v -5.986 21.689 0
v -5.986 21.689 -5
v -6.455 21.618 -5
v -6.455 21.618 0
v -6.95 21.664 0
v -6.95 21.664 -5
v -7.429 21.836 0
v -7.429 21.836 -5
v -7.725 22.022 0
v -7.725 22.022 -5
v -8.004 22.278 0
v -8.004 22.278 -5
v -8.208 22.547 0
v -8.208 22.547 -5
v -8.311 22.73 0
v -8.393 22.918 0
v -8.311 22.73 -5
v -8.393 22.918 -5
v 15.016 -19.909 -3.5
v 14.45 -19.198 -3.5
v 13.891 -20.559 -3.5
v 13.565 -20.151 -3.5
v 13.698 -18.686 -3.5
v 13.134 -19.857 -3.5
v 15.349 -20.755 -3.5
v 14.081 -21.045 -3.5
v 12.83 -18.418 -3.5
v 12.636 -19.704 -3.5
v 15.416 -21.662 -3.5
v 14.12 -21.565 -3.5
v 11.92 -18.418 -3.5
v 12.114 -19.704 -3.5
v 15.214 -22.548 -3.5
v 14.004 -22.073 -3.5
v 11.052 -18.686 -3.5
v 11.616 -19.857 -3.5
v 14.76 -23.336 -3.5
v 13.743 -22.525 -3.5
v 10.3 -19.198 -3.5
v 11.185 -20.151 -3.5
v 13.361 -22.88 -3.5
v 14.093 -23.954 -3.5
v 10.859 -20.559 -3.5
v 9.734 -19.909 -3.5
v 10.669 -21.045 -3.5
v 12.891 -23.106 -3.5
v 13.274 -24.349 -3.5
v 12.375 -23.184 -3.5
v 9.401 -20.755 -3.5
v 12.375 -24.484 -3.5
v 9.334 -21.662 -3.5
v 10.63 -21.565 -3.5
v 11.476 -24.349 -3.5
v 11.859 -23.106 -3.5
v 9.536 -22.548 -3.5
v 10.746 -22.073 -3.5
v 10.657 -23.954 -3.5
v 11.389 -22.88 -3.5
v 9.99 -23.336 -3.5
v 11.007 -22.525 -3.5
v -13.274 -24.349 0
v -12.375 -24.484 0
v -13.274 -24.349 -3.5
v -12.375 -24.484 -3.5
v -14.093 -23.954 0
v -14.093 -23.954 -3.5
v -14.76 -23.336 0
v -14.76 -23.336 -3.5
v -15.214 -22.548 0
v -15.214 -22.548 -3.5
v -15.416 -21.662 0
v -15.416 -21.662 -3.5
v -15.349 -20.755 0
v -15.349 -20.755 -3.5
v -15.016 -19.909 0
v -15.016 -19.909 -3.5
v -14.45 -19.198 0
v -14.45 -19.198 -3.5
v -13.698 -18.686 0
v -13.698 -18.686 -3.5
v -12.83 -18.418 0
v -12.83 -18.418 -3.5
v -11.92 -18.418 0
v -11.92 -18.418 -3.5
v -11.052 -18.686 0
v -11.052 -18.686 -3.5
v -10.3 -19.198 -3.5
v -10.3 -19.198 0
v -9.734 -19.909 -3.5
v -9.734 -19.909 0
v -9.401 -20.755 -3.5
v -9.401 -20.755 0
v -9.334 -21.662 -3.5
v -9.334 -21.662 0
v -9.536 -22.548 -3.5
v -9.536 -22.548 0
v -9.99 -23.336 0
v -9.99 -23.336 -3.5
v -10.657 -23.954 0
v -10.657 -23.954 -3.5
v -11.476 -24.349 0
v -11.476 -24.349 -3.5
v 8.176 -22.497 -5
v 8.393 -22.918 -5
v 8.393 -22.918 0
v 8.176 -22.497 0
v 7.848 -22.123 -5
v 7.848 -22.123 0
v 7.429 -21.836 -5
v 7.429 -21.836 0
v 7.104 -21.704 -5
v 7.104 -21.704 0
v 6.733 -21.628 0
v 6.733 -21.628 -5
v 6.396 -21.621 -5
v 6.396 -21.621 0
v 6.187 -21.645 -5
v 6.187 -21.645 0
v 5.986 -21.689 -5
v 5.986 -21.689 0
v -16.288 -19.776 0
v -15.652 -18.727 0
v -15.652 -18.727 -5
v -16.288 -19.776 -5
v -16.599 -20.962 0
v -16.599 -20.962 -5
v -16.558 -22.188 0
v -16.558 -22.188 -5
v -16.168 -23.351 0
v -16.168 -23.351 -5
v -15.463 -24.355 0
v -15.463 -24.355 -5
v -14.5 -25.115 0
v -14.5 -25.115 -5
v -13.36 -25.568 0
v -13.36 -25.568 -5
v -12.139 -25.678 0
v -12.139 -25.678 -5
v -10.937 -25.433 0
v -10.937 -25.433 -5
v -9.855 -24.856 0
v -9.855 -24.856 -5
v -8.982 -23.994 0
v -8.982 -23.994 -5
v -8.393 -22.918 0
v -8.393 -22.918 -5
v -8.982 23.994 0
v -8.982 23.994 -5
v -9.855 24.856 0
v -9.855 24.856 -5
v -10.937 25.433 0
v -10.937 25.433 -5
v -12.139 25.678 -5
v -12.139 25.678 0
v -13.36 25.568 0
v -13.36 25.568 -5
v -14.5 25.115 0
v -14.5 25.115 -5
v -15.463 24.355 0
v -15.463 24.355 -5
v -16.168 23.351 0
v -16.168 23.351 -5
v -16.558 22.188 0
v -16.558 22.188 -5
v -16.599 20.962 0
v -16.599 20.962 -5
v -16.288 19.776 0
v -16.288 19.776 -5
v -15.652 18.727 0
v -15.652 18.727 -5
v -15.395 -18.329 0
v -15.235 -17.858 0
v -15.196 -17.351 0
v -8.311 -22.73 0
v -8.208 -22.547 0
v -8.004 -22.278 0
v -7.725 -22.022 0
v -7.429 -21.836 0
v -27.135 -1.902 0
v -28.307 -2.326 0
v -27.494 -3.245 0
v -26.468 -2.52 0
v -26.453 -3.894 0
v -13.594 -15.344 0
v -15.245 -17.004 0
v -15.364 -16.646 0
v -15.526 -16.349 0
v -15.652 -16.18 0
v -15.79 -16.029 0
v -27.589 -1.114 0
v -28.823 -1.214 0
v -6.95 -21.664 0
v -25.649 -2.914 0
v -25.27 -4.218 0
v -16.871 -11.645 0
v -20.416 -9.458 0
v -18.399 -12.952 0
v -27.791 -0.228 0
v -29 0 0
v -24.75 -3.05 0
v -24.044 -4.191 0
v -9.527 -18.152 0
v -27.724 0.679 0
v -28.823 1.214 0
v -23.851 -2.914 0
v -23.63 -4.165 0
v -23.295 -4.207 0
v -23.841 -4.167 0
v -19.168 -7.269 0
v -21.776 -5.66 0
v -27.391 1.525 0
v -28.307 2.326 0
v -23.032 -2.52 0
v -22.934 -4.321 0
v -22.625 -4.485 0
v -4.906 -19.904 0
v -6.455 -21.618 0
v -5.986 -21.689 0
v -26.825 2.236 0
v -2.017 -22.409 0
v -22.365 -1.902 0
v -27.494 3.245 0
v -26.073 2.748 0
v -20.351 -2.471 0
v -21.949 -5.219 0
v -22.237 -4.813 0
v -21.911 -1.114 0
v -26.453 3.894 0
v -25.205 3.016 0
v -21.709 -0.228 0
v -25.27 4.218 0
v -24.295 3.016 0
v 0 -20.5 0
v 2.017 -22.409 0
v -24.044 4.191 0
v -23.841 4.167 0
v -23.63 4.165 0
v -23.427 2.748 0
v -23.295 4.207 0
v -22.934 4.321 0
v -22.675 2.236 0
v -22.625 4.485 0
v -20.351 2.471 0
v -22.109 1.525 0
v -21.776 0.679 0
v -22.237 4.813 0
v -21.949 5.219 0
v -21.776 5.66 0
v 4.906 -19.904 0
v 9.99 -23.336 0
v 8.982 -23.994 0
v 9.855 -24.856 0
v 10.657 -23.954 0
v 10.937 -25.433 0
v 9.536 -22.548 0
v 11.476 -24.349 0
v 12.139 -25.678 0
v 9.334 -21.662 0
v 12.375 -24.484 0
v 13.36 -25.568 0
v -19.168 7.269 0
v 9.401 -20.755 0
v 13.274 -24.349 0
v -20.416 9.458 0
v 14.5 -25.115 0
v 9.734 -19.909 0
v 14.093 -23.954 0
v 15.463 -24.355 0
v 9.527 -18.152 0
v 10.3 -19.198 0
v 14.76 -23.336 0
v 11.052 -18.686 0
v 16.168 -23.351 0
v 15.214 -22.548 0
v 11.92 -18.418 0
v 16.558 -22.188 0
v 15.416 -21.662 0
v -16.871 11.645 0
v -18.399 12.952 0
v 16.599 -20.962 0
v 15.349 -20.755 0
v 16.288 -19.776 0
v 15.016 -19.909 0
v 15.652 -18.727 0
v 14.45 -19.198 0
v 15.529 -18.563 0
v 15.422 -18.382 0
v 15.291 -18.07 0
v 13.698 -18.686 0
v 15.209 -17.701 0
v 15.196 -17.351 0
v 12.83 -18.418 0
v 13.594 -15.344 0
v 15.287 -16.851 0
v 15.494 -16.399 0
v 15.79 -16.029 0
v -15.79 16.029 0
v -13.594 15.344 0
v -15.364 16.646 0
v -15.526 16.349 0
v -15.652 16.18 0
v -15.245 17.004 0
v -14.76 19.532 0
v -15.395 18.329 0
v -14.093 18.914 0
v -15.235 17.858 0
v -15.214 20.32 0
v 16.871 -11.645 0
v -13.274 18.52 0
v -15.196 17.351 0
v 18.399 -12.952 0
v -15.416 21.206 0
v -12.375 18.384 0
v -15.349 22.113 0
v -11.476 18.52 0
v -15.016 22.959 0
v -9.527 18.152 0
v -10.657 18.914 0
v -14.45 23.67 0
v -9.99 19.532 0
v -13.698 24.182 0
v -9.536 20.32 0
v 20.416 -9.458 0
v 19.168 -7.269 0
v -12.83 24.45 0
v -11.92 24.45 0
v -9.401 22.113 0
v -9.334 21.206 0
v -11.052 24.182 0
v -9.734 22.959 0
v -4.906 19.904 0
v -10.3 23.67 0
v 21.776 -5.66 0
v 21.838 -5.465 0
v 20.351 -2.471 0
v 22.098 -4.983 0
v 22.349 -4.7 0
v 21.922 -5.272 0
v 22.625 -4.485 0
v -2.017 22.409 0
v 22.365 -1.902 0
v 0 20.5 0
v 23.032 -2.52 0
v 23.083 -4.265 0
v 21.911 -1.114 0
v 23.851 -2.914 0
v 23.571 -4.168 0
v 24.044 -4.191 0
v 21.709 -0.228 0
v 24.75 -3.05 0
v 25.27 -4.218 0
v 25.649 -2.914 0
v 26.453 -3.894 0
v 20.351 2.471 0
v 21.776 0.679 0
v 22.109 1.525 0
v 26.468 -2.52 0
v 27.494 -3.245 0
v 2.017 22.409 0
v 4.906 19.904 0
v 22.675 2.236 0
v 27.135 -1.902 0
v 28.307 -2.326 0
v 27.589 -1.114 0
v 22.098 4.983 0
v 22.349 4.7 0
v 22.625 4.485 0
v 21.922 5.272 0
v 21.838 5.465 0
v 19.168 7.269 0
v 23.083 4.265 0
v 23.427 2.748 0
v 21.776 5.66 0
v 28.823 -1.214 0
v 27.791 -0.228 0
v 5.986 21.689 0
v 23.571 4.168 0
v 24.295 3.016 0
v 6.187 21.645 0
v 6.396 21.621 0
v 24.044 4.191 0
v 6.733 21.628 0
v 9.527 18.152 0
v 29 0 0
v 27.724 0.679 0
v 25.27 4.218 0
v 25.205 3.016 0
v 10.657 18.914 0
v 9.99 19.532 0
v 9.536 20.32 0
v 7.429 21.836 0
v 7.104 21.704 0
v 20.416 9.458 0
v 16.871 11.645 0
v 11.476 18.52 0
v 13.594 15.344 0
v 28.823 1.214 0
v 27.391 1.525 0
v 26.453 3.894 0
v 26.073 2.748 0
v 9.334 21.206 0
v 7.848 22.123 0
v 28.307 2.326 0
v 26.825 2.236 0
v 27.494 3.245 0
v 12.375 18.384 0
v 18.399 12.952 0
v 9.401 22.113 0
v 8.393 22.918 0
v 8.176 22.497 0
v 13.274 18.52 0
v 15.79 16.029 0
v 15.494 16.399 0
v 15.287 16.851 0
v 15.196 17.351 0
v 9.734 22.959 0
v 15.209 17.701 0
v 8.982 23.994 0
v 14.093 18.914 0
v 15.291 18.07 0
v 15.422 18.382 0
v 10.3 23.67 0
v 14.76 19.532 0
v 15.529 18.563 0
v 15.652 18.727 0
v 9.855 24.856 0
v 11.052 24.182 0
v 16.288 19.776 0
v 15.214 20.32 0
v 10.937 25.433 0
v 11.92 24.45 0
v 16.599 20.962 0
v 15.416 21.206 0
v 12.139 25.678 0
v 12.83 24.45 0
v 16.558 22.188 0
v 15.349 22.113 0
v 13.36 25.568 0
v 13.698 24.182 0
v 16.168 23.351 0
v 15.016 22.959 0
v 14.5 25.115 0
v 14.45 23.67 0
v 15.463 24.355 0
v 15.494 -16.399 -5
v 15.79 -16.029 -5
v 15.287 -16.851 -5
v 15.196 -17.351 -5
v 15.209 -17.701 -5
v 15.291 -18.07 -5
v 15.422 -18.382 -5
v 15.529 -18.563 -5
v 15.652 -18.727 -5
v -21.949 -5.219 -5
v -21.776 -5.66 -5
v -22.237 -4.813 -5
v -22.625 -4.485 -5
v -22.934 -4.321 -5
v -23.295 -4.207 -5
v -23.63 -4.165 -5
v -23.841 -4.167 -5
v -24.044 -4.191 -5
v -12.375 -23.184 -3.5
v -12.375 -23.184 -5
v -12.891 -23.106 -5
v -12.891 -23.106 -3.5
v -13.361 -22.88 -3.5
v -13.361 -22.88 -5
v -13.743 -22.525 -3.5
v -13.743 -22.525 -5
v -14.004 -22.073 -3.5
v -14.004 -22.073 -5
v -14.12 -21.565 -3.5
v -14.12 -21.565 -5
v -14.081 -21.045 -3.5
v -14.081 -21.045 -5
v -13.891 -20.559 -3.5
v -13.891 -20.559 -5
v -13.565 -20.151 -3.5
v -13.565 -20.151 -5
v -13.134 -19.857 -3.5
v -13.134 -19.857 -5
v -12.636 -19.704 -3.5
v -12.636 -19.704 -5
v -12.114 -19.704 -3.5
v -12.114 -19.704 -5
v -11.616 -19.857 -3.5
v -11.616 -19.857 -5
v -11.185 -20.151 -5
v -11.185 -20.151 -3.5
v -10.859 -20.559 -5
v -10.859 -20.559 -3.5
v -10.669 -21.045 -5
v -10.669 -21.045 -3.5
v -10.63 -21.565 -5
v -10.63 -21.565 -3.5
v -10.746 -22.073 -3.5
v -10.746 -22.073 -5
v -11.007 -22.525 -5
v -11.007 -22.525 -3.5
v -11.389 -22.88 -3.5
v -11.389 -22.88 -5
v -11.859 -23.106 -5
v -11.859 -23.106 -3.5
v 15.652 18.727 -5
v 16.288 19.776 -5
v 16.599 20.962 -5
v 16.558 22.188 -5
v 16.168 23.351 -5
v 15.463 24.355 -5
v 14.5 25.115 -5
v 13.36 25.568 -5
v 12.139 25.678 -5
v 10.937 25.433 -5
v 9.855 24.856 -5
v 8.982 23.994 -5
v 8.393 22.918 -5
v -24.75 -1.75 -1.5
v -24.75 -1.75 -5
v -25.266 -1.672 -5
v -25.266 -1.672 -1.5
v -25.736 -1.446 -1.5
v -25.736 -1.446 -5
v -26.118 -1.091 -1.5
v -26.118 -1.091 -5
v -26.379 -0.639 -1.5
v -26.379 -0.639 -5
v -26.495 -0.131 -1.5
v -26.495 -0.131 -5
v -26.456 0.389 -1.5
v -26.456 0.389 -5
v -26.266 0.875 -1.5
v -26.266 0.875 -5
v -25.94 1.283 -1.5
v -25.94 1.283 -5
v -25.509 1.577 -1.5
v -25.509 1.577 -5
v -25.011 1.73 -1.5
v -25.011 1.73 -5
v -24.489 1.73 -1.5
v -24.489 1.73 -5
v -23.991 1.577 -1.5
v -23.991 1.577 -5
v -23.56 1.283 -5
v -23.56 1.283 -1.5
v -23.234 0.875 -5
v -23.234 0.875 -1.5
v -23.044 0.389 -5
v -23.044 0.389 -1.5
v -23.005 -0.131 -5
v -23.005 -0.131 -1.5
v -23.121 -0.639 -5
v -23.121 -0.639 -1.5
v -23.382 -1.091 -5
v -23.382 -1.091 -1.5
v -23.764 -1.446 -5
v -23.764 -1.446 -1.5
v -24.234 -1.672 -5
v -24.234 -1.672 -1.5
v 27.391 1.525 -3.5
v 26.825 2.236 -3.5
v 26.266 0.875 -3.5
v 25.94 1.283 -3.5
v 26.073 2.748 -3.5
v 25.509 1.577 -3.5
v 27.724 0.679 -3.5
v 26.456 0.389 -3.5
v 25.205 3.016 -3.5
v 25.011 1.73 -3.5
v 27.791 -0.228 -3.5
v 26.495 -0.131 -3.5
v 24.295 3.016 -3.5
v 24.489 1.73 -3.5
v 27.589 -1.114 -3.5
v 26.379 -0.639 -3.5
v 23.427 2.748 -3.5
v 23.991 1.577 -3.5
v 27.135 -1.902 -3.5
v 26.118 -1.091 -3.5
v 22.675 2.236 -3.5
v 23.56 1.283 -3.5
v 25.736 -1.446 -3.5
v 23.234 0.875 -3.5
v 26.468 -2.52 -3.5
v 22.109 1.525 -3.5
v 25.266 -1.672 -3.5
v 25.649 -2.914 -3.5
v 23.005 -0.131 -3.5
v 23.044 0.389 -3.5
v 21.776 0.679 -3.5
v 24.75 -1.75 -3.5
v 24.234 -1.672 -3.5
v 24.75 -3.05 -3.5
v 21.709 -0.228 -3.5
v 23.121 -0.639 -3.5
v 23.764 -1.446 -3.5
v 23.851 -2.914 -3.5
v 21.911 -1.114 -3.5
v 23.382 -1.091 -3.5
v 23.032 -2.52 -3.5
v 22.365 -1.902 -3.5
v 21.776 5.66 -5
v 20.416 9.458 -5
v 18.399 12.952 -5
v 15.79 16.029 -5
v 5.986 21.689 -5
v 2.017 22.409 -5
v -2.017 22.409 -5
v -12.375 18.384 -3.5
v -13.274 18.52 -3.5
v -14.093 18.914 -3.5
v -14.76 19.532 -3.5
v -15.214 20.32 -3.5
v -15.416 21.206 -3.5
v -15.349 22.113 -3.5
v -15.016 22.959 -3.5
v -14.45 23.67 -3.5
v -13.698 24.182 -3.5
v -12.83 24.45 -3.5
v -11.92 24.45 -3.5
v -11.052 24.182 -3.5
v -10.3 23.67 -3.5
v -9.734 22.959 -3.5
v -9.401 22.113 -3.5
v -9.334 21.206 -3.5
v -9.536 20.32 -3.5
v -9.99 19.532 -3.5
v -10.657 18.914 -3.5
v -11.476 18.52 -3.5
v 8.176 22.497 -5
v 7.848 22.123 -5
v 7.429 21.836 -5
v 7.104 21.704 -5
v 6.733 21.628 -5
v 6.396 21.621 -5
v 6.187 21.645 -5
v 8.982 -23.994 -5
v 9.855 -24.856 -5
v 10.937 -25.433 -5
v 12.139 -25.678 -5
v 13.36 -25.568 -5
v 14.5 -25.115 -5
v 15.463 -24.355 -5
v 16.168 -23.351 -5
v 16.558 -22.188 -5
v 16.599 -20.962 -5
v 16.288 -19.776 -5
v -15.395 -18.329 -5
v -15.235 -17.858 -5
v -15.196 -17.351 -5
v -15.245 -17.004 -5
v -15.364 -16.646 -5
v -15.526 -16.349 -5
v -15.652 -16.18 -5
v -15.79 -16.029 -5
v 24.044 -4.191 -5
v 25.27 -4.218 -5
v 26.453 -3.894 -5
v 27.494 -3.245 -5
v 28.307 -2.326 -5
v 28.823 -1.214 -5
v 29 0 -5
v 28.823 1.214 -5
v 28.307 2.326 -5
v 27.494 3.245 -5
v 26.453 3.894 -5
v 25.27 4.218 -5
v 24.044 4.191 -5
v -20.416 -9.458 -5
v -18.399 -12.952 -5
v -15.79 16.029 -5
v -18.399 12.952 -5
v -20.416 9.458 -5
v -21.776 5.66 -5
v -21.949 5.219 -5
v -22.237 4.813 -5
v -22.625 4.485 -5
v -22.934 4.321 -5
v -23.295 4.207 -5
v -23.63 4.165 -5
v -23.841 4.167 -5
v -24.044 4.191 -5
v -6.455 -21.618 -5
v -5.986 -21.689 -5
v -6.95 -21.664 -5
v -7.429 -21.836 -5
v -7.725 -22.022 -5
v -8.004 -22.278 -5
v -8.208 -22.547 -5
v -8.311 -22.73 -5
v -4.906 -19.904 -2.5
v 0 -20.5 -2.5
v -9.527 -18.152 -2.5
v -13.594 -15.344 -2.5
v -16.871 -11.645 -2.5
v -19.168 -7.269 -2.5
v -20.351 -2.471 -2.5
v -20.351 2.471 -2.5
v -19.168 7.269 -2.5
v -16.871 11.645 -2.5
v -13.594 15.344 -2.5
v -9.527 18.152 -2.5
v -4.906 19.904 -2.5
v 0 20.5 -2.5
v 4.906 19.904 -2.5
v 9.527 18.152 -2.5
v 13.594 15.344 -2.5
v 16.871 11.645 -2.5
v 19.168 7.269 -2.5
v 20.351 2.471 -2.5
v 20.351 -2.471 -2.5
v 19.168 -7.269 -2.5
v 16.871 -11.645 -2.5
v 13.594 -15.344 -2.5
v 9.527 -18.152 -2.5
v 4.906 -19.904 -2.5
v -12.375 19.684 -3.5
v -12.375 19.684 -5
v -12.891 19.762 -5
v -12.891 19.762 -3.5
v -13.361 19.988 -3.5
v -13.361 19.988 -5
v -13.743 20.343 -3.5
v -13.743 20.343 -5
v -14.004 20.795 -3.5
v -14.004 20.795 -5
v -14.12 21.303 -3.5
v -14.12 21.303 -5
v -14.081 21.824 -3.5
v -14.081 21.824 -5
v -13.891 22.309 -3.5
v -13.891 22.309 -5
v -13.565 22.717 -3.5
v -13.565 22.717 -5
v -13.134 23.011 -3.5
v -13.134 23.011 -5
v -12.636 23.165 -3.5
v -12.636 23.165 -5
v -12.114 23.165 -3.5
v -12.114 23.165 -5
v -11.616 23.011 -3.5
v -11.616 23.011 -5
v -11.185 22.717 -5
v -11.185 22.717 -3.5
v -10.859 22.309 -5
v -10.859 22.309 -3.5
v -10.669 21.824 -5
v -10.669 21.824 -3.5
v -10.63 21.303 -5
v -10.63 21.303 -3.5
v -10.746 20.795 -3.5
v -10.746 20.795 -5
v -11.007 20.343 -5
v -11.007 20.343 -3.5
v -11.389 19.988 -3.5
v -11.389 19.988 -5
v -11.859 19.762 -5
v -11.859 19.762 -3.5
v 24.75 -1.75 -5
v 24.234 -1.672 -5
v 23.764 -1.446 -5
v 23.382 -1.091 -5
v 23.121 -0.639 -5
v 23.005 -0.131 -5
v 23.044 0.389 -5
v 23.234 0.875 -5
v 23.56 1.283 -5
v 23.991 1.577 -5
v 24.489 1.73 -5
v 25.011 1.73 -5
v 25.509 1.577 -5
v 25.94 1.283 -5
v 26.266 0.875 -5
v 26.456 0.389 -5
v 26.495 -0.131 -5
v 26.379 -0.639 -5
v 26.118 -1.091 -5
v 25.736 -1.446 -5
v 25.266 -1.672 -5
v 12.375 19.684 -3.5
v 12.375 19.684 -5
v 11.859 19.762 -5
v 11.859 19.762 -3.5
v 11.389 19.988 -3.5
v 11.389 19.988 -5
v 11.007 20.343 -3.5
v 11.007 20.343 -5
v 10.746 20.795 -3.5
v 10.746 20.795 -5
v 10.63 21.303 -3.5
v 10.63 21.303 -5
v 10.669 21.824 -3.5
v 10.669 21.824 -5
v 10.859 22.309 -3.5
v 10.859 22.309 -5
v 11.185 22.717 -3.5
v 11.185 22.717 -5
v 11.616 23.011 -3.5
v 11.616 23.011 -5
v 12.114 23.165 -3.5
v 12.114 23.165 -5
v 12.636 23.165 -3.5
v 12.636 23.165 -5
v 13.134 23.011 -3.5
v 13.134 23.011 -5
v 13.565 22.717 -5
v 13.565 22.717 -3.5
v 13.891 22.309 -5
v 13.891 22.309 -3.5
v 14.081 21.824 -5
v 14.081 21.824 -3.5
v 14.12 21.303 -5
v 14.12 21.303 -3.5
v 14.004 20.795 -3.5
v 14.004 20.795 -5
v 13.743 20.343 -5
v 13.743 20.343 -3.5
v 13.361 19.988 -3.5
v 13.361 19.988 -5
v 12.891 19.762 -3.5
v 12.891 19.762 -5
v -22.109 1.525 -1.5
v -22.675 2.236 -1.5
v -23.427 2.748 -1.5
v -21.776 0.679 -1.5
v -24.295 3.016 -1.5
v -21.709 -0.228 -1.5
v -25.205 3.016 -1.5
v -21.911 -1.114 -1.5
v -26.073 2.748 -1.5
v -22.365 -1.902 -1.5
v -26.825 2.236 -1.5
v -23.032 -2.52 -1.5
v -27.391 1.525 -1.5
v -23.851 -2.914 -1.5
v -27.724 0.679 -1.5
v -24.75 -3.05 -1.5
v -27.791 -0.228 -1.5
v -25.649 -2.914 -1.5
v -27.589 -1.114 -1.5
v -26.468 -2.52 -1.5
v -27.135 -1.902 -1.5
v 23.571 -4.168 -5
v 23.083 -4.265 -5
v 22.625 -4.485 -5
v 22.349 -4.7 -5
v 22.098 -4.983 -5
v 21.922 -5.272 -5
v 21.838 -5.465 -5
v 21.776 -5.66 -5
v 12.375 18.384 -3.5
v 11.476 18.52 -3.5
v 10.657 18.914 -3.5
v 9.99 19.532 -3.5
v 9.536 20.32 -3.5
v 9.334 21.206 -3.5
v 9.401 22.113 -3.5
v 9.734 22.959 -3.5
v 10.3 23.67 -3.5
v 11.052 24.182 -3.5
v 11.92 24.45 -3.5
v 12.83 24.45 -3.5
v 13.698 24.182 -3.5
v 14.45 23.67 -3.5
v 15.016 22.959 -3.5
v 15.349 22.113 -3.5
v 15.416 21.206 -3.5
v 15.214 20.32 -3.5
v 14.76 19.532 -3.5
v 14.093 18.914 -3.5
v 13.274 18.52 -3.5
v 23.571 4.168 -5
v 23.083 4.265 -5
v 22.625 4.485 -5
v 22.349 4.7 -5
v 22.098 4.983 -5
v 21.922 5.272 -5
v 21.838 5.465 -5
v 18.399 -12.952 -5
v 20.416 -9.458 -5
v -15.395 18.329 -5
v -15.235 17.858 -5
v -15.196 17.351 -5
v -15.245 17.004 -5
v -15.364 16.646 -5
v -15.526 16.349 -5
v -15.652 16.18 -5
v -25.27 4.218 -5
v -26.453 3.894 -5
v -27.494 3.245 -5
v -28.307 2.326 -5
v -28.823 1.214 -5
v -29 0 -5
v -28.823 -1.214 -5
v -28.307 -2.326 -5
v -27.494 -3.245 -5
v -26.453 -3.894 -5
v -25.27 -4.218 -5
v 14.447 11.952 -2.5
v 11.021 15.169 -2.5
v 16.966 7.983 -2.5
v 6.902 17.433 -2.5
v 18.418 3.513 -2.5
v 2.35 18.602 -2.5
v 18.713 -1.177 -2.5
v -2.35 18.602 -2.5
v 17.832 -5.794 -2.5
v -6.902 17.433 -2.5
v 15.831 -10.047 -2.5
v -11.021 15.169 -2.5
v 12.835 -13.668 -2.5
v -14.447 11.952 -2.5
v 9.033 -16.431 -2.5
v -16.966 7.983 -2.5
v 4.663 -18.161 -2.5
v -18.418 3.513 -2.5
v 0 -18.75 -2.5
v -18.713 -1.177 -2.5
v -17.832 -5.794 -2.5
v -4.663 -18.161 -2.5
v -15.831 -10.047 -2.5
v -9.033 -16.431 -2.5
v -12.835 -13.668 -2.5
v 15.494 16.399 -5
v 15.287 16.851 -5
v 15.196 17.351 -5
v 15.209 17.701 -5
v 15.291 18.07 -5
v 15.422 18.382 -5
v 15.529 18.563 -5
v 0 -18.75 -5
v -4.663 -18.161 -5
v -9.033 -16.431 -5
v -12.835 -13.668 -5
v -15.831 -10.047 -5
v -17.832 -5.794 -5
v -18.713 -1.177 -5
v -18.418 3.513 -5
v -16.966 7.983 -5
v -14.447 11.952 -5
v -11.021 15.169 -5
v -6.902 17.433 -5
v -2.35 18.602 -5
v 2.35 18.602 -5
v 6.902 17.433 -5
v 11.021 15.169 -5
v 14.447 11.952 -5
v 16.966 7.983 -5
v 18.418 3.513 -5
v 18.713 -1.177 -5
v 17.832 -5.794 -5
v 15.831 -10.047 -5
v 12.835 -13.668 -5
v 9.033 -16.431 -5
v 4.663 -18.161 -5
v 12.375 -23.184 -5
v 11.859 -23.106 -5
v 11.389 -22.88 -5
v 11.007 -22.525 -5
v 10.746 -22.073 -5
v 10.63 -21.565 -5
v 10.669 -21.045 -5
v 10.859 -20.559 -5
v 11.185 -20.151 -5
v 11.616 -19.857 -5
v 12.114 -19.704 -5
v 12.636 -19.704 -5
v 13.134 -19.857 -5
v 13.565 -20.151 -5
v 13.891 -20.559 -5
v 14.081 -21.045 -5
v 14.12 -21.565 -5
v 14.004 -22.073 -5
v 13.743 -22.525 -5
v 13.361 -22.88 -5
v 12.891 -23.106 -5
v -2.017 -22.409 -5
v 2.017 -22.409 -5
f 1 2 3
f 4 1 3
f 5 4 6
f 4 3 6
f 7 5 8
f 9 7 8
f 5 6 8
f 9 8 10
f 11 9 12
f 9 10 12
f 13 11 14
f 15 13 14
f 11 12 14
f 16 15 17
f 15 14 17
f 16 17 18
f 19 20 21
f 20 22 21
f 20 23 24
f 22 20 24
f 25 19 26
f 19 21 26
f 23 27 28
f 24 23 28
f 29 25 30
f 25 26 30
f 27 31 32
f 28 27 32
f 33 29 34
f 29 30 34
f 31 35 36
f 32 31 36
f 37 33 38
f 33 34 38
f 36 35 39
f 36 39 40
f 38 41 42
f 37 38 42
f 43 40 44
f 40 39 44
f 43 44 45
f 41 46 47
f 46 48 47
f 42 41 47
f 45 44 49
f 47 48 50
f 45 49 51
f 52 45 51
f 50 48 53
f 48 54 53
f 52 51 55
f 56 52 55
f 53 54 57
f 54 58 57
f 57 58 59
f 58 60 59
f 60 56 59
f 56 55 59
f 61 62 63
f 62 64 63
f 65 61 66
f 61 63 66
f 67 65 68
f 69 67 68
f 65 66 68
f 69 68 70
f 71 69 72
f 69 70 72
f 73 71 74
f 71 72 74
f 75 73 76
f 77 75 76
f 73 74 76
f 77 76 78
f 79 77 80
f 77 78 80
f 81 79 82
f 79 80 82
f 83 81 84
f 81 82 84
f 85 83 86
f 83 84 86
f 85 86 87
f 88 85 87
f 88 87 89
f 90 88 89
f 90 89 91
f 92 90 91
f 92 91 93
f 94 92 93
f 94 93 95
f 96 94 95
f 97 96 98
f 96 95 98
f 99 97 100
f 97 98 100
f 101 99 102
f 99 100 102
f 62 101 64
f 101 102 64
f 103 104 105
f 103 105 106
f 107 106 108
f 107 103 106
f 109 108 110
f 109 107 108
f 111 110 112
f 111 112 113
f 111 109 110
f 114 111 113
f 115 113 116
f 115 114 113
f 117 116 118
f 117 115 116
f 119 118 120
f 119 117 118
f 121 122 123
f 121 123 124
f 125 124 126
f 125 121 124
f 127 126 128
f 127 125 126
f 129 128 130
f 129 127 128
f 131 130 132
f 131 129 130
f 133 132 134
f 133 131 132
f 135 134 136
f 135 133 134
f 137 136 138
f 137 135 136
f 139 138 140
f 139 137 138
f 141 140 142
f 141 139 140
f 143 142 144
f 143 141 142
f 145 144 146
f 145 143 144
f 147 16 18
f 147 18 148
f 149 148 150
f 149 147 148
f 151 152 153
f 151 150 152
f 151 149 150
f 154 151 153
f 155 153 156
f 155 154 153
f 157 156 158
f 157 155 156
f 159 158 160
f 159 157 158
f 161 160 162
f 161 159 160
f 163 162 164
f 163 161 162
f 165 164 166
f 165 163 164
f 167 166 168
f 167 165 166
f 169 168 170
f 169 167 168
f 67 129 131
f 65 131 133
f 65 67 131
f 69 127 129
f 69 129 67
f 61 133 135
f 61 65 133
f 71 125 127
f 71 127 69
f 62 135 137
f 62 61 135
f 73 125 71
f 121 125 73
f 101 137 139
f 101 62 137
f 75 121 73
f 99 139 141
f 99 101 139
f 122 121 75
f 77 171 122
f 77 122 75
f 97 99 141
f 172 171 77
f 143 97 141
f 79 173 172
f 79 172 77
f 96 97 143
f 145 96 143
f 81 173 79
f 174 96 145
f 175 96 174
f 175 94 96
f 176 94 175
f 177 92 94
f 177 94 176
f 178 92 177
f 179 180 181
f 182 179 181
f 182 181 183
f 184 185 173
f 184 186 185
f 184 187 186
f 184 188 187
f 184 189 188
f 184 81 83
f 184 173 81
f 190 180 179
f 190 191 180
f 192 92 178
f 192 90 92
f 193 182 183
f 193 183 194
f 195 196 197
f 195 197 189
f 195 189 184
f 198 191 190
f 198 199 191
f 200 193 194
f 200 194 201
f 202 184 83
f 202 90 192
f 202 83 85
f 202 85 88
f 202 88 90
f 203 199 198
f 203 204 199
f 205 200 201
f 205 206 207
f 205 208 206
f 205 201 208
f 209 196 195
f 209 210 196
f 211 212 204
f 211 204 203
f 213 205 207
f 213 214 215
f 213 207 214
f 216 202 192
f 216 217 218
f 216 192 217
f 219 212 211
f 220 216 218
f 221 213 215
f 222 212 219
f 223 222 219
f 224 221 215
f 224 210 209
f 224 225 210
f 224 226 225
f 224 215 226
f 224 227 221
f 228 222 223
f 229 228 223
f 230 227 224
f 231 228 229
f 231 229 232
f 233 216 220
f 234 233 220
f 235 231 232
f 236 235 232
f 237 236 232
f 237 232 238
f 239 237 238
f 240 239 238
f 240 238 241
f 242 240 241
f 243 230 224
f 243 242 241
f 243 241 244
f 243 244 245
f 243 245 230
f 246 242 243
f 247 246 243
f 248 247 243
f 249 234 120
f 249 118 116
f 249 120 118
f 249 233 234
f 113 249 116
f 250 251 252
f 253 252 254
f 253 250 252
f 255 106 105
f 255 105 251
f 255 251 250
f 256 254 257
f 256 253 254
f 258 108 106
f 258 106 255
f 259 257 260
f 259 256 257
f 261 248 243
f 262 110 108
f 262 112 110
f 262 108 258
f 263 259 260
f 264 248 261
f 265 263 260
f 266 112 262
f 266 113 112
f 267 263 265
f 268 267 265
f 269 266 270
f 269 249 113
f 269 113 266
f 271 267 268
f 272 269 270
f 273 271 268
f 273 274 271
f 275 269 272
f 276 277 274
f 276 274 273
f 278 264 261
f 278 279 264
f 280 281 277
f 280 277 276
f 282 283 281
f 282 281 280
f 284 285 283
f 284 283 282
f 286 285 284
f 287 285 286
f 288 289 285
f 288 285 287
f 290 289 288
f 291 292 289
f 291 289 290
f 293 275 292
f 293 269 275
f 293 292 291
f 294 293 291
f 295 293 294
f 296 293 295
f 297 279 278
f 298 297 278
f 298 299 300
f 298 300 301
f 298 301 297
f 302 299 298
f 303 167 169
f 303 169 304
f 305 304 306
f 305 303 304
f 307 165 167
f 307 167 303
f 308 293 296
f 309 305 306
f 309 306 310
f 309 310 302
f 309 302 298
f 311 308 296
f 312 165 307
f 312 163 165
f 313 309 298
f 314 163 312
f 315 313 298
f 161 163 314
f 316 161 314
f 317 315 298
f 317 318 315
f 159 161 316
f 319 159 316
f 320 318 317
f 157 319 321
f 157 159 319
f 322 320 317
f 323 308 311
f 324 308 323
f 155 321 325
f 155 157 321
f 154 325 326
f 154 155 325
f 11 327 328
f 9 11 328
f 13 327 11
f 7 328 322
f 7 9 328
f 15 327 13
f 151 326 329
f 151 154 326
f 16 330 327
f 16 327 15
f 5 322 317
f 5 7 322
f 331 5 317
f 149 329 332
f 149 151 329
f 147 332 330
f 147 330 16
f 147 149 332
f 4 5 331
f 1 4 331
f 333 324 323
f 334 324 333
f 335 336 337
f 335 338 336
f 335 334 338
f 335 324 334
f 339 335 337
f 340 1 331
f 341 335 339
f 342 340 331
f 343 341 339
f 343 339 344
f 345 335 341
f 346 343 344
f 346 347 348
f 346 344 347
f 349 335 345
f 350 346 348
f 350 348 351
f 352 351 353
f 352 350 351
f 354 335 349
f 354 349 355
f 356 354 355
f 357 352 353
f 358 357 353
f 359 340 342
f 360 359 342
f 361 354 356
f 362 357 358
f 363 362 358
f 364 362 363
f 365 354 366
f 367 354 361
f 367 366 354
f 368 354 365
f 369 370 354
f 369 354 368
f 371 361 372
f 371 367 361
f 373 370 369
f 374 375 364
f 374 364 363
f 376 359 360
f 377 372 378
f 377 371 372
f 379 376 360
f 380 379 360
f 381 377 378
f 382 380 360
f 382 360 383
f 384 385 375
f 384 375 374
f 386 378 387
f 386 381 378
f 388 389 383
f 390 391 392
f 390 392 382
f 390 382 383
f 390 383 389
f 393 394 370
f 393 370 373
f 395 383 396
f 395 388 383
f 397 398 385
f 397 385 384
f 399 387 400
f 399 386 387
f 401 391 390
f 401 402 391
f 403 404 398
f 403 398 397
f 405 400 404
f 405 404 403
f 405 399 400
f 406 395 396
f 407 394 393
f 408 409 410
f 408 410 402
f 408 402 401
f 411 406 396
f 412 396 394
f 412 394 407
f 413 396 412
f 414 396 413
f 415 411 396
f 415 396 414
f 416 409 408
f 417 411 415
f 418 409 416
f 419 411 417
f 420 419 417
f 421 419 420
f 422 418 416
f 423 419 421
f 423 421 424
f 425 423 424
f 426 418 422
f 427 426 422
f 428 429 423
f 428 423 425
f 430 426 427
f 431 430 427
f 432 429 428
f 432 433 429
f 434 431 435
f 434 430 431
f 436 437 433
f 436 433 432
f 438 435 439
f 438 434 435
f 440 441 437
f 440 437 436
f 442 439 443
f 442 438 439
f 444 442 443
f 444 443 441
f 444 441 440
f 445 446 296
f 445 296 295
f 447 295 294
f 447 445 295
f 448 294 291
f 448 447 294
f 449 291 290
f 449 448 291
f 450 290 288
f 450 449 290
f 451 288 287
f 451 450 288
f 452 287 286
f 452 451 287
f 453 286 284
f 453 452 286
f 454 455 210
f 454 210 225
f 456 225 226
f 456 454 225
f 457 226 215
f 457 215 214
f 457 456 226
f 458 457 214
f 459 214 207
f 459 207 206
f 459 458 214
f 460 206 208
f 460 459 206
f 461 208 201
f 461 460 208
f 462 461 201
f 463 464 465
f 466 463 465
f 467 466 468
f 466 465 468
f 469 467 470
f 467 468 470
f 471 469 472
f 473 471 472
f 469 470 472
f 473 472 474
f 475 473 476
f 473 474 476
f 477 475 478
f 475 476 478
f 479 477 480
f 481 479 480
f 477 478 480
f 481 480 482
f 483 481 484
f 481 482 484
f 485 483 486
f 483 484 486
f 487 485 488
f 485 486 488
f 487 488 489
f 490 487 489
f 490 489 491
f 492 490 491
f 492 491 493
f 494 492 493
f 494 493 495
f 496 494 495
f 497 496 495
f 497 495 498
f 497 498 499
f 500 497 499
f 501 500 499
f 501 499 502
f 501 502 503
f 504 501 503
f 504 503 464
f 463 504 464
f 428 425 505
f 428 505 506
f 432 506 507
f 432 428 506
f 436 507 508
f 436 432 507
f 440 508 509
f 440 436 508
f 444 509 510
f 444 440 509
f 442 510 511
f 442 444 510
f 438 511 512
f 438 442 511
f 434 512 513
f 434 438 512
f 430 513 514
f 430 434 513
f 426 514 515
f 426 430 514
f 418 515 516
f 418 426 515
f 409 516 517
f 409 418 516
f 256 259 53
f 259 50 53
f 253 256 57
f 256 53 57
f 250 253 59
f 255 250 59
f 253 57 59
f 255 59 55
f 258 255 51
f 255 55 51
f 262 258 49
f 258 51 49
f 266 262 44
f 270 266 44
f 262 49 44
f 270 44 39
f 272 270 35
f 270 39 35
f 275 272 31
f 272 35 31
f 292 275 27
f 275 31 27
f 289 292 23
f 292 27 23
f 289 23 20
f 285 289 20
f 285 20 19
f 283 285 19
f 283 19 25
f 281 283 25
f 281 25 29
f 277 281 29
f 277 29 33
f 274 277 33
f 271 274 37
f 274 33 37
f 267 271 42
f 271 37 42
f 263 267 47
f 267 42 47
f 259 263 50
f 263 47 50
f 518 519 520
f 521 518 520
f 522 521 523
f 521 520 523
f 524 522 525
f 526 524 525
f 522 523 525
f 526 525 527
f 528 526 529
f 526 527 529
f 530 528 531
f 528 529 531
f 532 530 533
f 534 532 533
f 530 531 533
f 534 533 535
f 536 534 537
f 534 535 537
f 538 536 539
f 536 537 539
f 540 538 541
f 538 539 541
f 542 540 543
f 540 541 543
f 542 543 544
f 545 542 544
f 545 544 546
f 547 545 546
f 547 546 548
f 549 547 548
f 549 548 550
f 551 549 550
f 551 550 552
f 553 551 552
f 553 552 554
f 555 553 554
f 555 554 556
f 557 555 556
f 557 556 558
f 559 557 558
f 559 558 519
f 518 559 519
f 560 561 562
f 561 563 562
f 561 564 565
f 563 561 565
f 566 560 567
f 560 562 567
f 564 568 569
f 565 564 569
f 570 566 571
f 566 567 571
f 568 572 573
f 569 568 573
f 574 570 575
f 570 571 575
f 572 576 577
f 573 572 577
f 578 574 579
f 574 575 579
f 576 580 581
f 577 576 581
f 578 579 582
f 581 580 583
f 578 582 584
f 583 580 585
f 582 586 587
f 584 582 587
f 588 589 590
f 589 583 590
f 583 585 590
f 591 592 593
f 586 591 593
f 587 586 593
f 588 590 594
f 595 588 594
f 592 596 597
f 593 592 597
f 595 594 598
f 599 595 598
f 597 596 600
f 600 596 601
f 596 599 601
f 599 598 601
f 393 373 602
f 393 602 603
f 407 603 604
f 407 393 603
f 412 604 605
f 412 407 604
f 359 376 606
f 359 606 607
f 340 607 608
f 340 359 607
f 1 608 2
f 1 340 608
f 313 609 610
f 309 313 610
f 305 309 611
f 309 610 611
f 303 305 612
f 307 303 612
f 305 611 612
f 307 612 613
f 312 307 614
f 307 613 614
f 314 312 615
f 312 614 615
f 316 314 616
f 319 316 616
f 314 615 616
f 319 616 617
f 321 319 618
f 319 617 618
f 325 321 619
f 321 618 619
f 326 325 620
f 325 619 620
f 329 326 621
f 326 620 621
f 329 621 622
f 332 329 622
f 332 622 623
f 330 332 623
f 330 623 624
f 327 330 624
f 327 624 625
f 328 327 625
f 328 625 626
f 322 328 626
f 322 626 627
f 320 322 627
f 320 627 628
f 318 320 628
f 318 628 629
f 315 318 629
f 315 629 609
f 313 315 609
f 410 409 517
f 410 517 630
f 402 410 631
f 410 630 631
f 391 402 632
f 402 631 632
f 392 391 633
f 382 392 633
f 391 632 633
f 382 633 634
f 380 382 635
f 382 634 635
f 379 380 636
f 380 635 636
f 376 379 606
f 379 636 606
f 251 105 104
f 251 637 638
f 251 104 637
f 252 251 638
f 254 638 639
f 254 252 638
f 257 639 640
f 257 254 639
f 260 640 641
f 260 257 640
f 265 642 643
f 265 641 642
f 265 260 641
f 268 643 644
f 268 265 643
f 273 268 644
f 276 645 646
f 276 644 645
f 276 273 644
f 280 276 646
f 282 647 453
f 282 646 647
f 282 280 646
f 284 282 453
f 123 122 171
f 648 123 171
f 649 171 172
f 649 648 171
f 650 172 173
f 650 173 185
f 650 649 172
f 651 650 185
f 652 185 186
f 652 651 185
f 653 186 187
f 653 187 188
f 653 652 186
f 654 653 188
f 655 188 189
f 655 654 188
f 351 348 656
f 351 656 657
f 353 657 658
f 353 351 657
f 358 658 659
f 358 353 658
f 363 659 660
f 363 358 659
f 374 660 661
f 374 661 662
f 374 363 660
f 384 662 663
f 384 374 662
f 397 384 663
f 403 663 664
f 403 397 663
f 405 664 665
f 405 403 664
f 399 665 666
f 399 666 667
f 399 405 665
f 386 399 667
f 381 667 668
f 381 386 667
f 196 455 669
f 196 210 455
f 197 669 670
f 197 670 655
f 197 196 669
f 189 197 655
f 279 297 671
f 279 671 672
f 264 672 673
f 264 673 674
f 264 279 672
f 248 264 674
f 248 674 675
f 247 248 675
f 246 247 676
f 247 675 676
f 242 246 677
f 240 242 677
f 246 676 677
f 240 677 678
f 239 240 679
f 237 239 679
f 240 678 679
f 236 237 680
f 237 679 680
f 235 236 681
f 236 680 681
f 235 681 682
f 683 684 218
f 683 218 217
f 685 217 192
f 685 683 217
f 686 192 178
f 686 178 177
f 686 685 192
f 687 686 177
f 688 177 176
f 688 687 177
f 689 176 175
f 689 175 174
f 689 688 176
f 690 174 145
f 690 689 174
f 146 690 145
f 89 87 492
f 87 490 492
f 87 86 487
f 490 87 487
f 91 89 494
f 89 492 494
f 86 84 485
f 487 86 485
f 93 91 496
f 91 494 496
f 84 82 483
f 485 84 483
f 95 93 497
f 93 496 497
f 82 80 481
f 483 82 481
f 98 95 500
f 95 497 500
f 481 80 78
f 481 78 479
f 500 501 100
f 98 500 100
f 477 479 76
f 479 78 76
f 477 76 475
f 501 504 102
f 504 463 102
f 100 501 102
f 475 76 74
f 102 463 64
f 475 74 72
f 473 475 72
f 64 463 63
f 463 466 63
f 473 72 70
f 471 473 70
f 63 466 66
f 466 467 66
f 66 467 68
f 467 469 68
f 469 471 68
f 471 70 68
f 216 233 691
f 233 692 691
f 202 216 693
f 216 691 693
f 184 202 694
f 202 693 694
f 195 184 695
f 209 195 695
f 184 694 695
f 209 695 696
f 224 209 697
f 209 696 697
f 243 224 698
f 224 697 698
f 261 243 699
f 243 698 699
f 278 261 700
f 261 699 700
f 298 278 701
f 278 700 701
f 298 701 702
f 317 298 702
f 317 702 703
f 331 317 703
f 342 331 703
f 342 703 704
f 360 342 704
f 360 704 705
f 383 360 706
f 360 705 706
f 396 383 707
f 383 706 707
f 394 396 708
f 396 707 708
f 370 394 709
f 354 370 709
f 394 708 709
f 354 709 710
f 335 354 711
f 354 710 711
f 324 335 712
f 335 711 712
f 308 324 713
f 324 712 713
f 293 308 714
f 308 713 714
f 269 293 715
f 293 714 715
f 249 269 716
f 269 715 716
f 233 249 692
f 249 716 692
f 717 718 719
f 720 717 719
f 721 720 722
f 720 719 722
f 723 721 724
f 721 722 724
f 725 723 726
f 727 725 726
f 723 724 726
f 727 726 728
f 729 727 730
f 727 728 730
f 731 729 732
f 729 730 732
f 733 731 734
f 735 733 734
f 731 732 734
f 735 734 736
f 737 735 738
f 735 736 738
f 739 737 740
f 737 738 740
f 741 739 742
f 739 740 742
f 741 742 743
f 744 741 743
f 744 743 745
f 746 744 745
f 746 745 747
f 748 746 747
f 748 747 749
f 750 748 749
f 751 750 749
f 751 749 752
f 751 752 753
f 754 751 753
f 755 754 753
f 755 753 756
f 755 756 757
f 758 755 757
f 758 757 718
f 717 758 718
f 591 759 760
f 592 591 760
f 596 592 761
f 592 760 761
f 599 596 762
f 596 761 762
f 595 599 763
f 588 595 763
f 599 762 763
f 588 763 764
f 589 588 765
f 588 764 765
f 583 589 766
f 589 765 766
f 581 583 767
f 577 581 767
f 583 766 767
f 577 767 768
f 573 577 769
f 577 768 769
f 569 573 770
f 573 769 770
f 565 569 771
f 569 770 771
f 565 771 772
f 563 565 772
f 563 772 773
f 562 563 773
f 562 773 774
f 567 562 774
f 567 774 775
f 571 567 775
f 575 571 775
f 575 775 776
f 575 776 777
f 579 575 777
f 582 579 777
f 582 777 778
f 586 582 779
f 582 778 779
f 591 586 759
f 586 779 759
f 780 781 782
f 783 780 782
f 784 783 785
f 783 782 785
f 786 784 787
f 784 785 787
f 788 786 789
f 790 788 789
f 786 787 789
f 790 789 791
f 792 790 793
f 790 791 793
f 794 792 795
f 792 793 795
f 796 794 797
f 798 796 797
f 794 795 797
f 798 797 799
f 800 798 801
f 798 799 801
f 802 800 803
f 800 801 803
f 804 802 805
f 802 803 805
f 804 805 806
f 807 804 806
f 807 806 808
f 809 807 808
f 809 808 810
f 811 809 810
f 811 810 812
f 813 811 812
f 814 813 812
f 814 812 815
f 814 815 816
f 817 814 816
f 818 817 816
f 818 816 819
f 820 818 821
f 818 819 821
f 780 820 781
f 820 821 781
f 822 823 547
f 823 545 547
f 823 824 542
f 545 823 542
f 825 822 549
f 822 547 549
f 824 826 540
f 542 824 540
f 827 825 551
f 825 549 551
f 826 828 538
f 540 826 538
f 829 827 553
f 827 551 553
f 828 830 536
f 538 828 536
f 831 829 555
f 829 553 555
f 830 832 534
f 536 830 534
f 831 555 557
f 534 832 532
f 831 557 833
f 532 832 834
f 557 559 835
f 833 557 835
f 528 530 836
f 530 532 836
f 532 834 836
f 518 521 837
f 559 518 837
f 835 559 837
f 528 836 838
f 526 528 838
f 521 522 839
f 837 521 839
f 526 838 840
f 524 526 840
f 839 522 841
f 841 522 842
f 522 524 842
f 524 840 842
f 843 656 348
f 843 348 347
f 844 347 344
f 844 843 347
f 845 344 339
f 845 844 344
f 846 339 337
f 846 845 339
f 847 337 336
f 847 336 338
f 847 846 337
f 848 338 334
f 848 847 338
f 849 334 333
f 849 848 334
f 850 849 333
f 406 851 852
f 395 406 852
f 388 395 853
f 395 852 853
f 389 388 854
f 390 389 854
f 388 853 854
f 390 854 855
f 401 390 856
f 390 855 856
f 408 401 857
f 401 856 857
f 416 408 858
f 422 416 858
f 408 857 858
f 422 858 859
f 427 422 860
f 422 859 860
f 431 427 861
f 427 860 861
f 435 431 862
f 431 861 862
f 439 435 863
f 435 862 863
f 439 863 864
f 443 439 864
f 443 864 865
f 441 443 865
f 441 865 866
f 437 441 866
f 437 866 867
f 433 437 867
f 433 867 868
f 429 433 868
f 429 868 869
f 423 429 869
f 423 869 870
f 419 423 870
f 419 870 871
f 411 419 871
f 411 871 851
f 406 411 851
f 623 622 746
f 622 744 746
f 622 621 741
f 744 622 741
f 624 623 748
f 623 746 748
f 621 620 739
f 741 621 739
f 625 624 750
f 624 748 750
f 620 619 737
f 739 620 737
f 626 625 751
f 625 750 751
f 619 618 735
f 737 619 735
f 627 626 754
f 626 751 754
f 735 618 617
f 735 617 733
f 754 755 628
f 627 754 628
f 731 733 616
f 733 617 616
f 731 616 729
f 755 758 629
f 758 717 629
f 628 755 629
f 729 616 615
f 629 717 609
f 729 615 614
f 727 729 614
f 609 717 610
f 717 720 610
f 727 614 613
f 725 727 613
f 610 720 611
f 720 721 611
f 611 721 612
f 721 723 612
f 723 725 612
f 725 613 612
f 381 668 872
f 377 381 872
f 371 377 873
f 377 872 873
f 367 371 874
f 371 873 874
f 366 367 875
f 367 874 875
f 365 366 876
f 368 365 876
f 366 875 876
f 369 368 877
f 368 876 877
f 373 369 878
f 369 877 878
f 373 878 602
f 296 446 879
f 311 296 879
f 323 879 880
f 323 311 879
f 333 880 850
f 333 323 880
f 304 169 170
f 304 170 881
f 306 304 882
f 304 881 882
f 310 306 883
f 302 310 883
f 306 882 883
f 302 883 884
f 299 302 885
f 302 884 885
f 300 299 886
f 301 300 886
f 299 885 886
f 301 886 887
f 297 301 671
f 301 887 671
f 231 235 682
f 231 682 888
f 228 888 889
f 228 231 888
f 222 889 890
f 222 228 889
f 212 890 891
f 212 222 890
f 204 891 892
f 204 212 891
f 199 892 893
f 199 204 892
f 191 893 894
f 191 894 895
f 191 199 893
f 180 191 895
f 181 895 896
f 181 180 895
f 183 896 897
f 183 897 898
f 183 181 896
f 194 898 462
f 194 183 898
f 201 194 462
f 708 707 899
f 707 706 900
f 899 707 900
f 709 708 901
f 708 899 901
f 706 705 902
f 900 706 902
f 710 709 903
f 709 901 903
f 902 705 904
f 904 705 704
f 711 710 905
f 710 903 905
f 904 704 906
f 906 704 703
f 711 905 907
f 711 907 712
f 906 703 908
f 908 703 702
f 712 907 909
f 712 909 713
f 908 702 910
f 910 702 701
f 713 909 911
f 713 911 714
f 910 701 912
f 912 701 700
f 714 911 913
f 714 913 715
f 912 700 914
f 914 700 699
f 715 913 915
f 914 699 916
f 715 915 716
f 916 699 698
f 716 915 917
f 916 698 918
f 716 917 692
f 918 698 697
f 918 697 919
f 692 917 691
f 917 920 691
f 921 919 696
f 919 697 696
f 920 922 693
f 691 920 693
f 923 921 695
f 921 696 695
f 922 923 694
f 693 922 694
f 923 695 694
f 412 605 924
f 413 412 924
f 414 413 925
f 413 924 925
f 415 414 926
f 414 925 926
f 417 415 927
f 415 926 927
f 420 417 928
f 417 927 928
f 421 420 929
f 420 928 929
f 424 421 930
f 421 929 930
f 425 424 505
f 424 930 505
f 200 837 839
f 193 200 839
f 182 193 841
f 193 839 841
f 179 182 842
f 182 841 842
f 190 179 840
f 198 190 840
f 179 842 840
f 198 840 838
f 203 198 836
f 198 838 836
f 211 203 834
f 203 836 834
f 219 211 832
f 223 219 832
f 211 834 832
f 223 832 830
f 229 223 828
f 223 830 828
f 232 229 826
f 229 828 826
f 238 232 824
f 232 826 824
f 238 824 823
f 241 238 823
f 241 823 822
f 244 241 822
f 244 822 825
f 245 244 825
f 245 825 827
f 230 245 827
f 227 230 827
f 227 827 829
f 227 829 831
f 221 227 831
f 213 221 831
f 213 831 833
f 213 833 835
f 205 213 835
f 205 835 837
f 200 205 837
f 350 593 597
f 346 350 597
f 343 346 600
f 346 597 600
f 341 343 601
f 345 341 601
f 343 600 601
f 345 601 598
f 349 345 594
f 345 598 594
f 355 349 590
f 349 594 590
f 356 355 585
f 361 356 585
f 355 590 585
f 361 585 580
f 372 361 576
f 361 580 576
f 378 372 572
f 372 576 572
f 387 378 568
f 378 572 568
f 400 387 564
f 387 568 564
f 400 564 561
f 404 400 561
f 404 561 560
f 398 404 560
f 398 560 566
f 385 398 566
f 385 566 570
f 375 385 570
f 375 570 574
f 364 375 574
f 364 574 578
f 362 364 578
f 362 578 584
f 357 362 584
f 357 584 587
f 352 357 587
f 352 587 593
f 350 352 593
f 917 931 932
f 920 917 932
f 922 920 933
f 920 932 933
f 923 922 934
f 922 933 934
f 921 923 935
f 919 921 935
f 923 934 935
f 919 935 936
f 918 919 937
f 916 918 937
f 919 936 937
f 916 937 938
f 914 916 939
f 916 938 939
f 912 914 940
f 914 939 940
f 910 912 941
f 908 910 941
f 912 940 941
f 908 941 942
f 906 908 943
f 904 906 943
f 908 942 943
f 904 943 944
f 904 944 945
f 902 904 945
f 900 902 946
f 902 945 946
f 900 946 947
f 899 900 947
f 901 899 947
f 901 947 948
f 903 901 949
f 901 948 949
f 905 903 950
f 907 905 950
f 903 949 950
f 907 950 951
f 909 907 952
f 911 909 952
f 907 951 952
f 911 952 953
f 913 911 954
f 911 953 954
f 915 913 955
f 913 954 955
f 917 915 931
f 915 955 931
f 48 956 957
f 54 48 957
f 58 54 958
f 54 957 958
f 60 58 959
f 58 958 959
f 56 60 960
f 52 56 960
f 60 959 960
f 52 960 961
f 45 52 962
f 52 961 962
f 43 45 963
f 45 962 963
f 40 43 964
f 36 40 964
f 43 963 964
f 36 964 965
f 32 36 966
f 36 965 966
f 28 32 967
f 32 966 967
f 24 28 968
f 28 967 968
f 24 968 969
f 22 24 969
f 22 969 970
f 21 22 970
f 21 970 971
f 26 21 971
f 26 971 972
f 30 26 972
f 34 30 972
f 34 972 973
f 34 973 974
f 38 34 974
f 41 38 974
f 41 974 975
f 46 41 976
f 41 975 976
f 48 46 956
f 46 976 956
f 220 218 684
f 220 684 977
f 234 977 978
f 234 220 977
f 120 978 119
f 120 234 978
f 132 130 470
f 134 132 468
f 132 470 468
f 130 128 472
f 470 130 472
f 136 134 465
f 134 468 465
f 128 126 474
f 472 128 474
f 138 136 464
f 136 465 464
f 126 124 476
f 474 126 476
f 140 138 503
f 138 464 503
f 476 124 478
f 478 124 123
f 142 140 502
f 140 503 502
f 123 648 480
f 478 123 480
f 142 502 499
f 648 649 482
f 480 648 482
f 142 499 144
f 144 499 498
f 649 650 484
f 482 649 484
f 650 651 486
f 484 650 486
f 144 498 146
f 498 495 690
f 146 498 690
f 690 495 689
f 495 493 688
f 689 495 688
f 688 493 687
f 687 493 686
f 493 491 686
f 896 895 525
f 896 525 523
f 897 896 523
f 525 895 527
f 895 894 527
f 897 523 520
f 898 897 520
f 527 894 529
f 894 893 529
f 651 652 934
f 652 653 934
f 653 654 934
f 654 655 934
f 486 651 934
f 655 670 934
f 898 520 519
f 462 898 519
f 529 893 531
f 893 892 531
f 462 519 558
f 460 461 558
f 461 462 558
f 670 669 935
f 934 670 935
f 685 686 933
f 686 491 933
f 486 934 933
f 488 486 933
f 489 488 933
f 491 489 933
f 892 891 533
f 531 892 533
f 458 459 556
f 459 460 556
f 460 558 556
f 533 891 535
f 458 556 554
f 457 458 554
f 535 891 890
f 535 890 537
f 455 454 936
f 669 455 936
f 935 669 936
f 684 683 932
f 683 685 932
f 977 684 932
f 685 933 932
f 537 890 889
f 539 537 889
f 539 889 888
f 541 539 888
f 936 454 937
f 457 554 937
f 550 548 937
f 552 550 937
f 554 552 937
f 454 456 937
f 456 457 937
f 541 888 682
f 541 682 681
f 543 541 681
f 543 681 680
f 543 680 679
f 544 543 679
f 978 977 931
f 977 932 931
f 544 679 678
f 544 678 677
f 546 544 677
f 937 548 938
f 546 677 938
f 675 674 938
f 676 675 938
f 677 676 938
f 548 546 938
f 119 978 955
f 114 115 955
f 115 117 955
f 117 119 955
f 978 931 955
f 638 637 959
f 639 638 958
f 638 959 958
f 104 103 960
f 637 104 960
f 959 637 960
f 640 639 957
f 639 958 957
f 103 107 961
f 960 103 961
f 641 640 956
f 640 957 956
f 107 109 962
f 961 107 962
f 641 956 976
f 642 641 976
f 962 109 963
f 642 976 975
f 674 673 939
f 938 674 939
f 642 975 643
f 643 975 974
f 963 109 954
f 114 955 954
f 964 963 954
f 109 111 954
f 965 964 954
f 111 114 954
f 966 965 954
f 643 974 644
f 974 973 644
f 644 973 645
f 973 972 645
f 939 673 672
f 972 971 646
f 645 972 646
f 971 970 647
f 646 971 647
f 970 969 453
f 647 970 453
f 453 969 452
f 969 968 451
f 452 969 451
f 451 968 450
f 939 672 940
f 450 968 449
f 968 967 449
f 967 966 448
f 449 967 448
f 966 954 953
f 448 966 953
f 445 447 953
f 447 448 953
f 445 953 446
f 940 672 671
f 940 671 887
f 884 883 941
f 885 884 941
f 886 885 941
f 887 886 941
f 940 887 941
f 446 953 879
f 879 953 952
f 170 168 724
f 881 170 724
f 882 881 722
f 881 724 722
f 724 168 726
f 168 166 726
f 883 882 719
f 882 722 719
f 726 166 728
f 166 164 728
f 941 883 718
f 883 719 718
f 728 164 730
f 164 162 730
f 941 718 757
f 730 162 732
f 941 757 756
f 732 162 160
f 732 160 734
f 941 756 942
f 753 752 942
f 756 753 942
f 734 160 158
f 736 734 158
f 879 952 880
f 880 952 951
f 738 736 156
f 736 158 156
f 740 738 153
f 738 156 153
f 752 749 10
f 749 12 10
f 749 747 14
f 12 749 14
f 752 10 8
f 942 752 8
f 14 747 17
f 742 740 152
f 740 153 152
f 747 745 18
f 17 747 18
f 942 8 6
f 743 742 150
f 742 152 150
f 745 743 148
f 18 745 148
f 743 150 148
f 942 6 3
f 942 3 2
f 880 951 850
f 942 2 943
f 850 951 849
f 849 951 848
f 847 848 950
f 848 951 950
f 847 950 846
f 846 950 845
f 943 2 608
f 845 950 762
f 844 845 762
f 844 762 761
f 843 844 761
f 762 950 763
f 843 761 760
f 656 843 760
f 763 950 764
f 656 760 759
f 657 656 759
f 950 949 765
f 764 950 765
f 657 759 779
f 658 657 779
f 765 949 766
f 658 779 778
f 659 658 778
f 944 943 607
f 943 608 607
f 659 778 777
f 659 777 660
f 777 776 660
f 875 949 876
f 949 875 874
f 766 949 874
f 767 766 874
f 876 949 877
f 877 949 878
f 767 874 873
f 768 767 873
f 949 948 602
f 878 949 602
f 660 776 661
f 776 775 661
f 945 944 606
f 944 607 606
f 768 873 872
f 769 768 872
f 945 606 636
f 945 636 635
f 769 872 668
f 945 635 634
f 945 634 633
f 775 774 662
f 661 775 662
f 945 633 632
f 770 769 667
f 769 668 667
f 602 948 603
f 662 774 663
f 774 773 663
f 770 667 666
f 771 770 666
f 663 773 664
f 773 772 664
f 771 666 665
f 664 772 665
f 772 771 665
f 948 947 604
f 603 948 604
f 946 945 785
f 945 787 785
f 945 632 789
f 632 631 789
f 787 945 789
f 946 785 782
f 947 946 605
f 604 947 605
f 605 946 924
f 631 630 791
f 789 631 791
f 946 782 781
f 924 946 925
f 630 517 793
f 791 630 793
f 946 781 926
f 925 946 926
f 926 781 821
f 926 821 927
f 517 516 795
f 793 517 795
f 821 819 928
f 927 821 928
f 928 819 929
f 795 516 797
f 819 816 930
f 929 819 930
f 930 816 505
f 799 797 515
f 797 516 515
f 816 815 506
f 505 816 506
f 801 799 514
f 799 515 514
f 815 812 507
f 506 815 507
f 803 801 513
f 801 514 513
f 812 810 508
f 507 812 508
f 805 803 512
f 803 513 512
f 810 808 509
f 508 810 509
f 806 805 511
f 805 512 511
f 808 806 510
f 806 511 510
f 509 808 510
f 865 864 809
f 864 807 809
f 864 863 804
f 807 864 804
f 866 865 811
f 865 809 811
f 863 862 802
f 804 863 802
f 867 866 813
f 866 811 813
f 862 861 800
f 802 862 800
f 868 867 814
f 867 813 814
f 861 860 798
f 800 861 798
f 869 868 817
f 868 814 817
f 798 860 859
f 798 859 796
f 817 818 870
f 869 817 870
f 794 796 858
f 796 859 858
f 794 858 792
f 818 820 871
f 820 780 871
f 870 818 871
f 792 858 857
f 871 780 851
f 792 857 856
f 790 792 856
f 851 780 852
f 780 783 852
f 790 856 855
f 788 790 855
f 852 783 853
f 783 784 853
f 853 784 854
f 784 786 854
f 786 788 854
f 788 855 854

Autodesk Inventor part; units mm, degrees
ref_plane "YZ Plane" through (0, 0, 0) normal (1, 0, 0) x (0, 1, 0)
ref_plane "XZ Plane" through (0, 0, 0) normal (0, 1, 0) x (-1, 0, 0)
ref_plane "XY Plane" through (0, 0, 0) normal (0, 0, 1) x (1, 0, 0)
sketch "Sketch1" plane through (0, 0, 0) normal (0, 0, 1) x (1, 0, 0)
  circle A0 centre (0, 0) radius 20.5 construction
  line L0 (0, 0) -> (29, 0)
  circle A1 centre (24.75, 0) radius 4.25
  circle A2 centre (24.75, 0) radius 3 construction
  circle A3 centre (24.75, 0) radius 3.05 construction
  circle A4 centre (24.75, 0) radius 2.75 construction
  circle A5 centre (24.75, 0) radius 3.25 construction
  circle A6 centre (0, 0) radius 22.5
  circle A7 centre (12.375, 21.4341) radius 4.25
  circle A8 centre (-12.375, 21.4341) radius 4.25
  circle A9 centre (-24.75, 0) radius 4.25
  circle A10 centre (-12.375, -21.4341) radius 4.25
  circle A11 centre (12.375, -21.4341) radius 4.25
  point P0 (22.2374, -3.4277)
  point P1 (22.2374, 3.4277)
  point P2 (14.5, 25.1147)
  point P3 (-14.5, 25.1147)
  point P4 (-29, 0)
  point P5 (-14.5, -25.1147)
  point P6 (14.5, -25.1147)
  point P7 (14.0872, 17.5443)
  point P8 (8.1502, 20.972)
  point P9 (-8.1502, 20.972)
  point P10 (-14.0872, 17.5443)
  point P11 (-22.2374, -3.4277)
  point P12 (-22.2374, 3.4277)
  point P13 (-14.0872, -17.5443)
  point P14 (-8.1502, -20.972)
  point P15 (8.1502, -20.972)
  point P16 (14.0872, -17.5443)
  dimension "InsideDiameter" = 41
  dimension "SpacerOuterDiameter" = 6
  dimension "SpacerGap" = 0.05
  dimension "M3_HeadDiameter" = 5.5
  dimension "HeadDiameterThickness" = 0.5
  dimension "WallThickness" = 1
  dimension "d38" = 2
  dimension "d41" = 360
extrude "Extrusion1" add sketch "Sketch1" against normal blind 5
hole "Hole1" at (0, 0, 0) direction (0, 0, -1) diameter 37.5 end through all counterbore diameter 41 counterbore depth 2.5
hole "Hole2" at (24.75, 0, 0) at (12.375, -21.4341, 0) at (-12.375, -21.4341, 0) at (-12.375, 21.4341, 0) at (12.375, 21.4341, 0) direction (0, 0, -1) diameter 3.5 end through all counterbore diameter 6.1 counterbore depth 3.5
hole "Hole3" at (-24.75, 0, 0) direction (0, 0, -1) diameter 3.5 end through all counterbore diameter 6.1 counterbore depth 1.5
fillet "Fillet1" radius 2 12 edges at (22.2374, 3.4277, -2.5) (22.2374, -3.4277, -2.5) (14.0872, -17.5443, -2.5) (8.1502, -20.972, -2.5) (-14.0872, -17.5443, -2.5) (-8.1502, -20.972, -2.5) (-22.2374, -3.4277, -2.5) (-22.2374, 3.4277, -2.5) (-14.0872, 17.5443, -2.5) (-8.1502, 20.972, -2.5) (8.1502, 20.972, -2.5) (14.0872, 17.5443, -2.5)
equation "\"InsideDiameter_\" = InsideDiameter"
equation "\"SpacerDiameter\" = SpacerOuterDiameter + 2 * SpacerGap"
equation "\"d33\" = SpacerOuterDiameter + 2 * SpacerGap"
properties part number "CrossRollerBearingOuterSupportStand" material "Aluminum 7075"
